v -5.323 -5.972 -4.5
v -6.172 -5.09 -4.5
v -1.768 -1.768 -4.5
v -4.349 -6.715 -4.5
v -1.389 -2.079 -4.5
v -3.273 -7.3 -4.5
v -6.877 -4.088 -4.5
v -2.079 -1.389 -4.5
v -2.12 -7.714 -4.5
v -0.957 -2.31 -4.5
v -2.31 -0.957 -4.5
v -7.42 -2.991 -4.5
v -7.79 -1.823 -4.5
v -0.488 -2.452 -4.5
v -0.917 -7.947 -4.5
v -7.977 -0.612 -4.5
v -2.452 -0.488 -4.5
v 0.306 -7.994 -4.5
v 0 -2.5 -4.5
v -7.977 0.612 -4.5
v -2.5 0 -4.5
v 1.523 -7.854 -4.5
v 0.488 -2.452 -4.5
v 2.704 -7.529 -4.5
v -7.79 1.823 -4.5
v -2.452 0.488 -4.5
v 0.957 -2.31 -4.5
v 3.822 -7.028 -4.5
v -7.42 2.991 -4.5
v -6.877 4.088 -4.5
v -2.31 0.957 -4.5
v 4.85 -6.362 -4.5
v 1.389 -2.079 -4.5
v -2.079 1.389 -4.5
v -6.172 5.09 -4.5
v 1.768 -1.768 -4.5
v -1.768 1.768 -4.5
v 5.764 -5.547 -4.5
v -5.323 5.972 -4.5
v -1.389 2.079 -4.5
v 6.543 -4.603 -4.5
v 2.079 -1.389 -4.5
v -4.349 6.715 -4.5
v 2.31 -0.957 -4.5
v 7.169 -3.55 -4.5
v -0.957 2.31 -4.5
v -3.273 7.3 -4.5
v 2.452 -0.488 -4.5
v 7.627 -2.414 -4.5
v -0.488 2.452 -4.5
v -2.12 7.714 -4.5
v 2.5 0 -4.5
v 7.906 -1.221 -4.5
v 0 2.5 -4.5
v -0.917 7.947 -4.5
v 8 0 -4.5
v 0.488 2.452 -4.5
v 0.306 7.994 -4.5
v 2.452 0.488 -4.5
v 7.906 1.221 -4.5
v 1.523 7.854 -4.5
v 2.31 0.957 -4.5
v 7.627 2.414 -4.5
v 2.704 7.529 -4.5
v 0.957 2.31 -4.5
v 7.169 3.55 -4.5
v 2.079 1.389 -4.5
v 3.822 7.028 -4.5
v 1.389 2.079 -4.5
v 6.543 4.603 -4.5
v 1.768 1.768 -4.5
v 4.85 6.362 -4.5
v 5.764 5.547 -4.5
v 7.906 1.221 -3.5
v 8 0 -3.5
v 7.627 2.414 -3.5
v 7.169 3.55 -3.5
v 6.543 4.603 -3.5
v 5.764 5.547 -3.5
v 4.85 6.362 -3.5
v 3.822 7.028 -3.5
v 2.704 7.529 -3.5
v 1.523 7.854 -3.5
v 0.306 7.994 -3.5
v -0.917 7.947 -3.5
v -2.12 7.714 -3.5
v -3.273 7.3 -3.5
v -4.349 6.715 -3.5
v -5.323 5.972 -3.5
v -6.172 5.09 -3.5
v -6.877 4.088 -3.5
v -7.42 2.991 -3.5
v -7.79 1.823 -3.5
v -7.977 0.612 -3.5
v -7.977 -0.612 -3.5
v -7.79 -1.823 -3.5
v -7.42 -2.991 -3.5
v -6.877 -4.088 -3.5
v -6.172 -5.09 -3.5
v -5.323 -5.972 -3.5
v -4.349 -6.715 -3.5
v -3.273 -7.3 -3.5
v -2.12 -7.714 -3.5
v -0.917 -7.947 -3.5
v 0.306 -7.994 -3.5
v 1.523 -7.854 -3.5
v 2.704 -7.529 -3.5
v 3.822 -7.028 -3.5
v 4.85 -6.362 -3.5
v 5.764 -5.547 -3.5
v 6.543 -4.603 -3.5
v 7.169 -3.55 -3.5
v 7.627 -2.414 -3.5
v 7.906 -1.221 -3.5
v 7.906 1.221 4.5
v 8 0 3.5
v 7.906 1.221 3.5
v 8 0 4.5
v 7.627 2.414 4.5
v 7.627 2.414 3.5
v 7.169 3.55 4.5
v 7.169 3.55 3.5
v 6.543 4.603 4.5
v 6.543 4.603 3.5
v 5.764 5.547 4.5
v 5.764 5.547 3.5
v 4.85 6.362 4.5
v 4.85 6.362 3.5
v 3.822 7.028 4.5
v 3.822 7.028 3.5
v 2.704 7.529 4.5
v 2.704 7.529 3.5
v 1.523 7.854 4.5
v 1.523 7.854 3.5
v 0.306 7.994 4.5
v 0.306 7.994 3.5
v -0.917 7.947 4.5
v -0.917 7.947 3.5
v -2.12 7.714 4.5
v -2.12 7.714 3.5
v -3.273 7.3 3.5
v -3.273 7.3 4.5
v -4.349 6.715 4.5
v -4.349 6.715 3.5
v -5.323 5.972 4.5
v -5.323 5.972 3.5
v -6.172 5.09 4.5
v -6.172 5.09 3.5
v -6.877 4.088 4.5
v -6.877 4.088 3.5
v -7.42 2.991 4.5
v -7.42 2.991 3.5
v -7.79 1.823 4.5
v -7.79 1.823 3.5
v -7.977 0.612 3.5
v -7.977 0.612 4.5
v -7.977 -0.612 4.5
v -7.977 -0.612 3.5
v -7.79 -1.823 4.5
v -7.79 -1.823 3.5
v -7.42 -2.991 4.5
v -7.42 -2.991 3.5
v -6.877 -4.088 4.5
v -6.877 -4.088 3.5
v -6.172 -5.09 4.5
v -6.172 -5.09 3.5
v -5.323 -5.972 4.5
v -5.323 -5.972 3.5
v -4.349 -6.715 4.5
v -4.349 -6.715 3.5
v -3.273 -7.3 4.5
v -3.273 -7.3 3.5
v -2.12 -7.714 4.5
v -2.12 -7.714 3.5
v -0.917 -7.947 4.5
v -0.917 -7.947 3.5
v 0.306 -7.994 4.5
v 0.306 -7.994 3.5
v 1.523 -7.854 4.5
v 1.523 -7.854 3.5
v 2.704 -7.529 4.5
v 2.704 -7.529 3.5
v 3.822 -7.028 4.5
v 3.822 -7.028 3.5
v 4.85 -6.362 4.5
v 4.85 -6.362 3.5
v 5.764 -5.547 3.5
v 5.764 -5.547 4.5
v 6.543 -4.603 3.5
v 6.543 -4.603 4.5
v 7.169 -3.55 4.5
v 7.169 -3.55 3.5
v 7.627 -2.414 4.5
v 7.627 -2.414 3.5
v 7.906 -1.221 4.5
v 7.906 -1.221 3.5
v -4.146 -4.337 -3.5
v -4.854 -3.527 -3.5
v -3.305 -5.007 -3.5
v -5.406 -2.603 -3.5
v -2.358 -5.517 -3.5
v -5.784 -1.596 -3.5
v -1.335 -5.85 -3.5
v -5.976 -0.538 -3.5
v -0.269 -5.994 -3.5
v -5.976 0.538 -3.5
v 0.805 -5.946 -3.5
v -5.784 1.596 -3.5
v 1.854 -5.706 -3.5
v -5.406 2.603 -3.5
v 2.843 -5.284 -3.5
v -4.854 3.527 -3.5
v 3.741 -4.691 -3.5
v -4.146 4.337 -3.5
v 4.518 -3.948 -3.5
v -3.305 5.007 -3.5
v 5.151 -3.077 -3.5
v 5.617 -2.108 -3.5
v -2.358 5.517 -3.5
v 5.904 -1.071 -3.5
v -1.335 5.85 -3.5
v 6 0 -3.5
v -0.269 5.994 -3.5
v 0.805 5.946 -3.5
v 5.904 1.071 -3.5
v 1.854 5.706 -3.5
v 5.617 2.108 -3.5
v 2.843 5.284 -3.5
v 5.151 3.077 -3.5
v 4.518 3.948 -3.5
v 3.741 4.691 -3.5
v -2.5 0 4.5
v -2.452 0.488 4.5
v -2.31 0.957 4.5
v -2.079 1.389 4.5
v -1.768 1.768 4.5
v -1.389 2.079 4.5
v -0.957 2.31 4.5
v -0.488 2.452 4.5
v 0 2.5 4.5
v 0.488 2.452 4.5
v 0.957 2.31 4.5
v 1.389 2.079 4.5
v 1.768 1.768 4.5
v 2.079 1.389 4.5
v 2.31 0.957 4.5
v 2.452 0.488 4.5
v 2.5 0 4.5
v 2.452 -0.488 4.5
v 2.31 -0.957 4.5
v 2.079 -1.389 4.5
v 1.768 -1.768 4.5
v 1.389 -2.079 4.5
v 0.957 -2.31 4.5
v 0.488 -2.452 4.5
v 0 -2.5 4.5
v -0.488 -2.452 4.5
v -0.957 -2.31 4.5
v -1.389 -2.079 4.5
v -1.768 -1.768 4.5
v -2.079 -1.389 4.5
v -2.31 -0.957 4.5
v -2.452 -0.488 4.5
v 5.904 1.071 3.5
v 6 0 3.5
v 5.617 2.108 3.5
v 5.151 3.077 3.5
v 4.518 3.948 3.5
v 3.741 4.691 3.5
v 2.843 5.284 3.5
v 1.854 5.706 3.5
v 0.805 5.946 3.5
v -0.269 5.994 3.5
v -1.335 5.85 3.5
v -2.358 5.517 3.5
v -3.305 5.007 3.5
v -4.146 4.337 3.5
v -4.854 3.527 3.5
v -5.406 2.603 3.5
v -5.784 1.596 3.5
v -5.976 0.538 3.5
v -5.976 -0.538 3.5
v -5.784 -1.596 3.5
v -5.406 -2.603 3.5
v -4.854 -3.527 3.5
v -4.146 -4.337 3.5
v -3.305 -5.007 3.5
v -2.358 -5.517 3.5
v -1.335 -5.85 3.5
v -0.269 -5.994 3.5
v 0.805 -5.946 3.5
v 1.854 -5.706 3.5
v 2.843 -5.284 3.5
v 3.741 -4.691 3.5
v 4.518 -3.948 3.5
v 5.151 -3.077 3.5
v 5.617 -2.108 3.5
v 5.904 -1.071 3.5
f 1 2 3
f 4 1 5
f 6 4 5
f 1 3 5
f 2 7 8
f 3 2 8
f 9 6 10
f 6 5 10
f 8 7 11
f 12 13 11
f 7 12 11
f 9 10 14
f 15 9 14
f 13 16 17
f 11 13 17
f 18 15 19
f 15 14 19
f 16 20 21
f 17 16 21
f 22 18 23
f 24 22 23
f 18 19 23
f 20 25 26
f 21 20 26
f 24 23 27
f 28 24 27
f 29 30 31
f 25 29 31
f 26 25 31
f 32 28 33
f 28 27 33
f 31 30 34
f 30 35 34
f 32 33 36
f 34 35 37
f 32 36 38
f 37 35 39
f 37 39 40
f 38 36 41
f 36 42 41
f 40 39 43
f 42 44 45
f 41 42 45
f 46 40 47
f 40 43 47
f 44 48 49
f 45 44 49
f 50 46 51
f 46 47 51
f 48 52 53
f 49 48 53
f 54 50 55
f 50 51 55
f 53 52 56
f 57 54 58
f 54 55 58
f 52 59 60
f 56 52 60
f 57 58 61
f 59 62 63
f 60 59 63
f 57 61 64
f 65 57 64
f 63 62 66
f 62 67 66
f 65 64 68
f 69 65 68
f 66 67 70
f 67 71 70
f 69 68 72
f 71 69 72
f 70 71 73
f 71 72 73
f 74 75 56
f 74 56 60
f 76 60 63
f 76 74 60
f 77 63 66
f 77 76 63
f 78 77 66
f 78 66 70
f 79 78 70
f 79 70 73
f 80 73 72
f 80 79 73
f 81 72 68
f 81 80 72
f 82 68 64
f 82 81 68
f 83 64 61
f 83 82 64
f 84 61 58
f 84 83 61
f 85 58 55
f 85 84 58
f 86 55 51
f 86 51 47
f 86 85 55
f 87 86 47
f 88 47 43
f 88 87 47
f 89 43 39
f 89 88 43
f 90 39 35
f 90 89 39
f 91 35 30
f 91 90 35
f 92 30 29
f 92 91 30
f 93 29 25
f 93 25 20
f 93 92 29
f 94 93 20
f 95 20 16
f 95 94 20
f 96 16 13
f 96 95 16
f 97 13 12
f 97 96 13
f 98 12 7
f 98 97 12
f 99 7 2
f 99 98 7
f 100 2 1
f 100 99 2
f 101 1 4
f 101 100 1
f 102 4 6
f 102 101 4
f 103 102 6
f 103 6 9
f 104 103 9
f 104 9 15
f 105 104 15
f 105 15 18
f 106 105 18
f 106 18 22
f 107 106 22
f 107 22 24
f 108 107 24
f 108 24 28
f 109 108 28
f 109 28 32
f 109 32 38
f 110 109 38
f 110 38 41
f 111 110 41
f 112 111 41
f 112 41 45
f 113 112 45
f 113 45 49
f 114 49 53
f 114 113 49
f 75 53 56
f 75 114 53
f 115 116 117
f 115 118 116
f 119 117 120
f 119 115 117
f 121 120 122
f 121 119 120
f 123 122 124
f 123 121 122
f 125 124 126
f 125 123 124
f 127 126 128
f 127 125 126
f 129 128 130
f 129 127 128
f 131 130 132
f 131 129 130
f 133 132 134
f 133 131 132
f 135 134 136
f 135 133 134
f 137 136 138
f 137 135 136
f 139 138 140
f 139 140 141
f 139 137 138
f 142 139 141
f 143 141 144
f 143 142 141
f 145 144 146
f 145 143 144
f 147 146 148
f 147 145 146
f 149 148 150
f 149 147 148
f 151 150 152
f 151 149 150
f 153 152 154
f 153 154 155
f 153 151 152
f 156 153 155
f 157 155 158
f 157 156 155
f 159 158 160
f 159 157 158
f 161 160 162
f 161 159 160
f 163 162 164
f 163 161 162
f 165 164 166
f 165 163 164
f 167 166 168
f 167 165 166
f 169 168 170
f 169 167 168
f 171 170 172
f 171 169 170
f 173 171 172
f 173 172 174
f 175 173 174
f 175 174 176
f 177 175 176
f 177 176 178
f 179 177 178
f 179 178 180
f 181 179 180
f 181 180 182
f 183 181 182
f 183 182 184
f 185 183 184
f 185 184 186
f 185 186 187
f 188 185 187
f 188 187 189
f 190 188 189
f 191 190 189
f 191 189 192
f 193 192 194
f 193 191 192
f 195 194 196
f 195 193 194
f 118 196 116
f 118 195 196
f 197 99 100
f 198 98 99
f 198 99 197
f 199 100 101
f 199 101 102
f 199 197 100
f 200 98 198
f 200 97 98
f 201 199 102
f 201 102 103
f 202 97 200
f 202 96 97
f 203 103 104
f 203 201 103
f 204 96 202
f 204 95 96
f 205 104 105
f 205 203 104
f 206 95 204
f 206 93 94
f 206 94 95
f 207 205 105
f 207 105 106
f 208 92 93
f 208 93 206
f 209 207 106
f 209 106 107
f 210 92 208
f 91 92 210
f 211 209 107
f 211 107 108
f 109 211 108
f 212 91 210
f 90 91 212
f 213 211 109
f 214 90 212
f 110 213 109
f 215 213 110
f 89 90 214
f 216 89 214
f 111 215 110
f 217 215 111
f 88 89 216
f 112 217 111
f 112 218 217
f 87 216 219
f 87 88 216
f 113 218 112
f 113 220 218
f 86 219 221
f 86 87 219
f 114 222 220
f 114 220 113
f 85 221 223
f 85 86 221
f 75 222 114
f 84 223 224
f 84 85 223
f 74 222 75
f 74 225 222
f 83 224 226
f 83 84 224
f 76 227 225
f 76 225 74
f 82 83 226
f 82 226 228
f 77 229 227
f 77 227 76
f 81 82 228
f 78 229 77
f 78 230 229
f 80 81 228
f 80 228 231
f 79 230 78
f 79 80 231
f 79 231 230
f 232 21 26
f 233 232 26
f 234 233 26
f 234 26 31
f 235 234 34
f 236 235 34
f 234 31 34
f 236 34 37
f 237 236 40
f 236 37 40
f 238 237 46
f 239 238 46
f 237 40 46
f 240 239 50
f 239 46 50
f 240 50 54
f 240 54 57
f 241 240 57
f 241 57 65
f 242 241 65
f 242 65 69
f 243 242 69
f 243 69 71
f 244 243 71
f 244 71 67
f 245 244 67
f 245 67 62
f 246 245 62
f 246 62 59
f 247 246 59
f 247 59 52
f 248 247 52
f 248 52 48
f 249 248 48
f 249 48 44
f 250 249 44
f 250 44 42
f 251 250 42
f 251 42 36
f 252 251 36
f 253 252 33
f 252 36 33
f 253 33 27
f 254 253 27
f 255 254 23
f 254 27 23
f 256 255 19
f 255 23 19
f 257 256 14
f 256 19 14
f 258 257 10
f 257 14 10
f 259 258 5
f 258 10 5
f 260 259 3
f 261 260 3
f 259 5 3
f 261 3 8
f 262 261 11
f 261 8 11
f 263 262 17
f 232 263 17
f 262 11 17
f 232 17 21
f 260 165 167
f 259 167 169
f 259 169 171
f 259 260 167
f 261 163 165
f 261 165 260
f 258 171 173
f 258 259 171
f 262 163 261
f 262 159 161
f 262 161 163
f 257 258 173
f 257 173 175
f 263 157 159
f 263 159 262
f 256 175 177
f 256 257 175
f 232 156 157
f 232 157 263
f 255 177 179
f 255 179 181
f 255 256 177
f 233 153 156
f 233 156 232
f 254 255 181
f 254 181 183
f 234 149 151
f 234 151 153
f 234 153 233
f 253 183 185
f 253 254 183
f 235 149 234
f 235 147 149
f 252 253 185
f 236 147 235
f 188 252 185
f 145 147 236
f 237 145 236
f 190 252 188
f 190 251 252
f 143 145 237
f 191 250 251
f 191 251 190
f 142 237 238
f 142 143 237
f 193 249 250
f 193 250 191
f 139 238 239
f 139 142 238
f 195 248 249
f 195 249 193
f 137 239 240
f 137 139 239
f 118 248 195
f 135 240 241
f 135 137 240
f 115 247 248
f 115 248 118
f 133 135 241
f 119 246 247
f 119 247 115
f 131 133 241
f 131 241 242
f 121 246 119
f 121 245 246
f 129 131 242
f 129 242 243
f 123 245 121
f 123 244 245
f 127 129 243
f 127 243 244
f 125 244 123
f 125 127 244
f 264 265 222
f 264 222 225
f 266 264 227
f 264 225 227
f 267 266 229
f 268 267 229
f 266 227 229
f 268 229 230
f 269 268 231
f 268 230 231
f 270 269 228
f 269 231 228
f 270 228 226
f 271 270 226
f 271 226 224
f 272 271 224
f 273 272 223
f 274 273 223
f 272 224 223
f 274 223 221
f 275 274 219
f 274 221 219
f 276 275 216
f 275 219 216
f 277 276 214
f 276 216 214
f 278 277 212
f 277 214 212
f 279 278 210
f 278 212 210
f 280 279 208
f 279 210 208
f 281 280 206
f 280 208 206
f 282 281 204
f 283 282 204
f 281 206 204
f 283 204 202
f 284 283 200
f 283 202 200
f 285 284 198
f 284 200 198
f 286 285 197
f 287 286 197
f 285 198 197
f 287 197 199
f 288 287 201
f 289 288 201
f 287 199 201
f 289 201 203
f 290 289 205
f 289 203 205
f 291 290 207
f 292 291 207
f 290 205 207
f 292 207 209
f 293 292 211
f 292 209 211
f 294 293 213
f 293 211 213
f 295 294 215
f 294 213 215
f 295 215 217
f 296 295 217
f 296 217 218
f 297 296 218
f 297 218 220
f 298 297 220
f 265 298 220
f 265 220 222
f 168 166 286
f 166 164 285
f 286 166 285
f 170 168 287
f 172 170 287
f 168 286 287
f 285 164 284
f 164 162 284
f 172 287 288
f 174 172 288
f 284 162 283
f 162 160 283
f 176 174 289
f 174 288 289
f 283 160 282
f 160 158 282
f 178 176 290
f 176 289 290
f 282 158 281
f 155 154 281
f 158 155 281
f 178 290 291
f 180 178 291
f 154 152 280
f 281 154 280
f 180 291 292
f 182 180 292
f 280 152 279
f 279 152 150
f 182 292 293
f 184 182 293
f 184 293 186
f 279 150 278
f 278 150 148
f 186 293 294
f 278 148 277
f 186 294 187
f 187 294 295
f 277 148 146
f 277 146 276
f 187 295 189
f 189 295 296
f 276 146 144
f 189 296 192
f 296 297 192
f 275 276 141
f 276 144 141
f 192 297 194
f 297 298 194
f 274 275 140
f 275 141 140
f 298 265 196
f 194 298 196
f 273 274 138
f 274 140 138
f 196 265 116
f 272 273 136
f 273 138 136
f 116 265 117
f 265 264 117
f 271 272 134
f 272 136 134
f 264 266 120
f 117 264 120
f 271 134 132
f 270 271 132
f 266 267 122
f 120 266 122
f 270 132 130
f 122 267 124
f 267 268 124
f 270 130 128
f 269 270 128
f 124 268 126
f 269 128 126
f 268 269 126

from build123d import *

# Parameters (mm, degrees)
SKETCH3_R           = 8
BOSS_EXTRUDE1_DEPTH = 4.5
SKETCH4_R           = 2.5
CUT_EXTRUDE1_DEPTH  = 15.456832295
SKETCH6_R           = 8
SKETCH6_R_2         = 6
CUT_EXTRUDE2_DEPTH  = 3.5


with BuildPart() as part:
    # Sketch3 → Boss-Extrude1 (new, symmetric)
    with BuildSketch(Plane.XY):
        Circle(SKETCH3_R)
    extrude(amount=BOSS_EXTRUDE1_DEPTH, both=True)

    # Sketch4 → Cut-Extrude1 (cut, through all)
    with BuildSketch(Plane(origin=(0, 0, -4.5), x_dir=(-1, 0, 0), z_dir=(0, 0, -1))):
        Circle(SKETCH4_R)
    extrude(amount=-CUT_EXTRUDE1_DEPTH, mode=Mode.SUBTRACT)

    # Sketch6 → Cut-Extrude2 (cut, symmetric)
    with BuildSketch(Plane.XY):
        Circle(SKETCH6_R)
        Circle(SKETCH6_R_2, mode=Mode.SUBTRACT)
    extrude(amount=CUT_EXTRUDE2_DEPTH, both=True, mode=Mode.SUBTRACT)


solid = part.part
